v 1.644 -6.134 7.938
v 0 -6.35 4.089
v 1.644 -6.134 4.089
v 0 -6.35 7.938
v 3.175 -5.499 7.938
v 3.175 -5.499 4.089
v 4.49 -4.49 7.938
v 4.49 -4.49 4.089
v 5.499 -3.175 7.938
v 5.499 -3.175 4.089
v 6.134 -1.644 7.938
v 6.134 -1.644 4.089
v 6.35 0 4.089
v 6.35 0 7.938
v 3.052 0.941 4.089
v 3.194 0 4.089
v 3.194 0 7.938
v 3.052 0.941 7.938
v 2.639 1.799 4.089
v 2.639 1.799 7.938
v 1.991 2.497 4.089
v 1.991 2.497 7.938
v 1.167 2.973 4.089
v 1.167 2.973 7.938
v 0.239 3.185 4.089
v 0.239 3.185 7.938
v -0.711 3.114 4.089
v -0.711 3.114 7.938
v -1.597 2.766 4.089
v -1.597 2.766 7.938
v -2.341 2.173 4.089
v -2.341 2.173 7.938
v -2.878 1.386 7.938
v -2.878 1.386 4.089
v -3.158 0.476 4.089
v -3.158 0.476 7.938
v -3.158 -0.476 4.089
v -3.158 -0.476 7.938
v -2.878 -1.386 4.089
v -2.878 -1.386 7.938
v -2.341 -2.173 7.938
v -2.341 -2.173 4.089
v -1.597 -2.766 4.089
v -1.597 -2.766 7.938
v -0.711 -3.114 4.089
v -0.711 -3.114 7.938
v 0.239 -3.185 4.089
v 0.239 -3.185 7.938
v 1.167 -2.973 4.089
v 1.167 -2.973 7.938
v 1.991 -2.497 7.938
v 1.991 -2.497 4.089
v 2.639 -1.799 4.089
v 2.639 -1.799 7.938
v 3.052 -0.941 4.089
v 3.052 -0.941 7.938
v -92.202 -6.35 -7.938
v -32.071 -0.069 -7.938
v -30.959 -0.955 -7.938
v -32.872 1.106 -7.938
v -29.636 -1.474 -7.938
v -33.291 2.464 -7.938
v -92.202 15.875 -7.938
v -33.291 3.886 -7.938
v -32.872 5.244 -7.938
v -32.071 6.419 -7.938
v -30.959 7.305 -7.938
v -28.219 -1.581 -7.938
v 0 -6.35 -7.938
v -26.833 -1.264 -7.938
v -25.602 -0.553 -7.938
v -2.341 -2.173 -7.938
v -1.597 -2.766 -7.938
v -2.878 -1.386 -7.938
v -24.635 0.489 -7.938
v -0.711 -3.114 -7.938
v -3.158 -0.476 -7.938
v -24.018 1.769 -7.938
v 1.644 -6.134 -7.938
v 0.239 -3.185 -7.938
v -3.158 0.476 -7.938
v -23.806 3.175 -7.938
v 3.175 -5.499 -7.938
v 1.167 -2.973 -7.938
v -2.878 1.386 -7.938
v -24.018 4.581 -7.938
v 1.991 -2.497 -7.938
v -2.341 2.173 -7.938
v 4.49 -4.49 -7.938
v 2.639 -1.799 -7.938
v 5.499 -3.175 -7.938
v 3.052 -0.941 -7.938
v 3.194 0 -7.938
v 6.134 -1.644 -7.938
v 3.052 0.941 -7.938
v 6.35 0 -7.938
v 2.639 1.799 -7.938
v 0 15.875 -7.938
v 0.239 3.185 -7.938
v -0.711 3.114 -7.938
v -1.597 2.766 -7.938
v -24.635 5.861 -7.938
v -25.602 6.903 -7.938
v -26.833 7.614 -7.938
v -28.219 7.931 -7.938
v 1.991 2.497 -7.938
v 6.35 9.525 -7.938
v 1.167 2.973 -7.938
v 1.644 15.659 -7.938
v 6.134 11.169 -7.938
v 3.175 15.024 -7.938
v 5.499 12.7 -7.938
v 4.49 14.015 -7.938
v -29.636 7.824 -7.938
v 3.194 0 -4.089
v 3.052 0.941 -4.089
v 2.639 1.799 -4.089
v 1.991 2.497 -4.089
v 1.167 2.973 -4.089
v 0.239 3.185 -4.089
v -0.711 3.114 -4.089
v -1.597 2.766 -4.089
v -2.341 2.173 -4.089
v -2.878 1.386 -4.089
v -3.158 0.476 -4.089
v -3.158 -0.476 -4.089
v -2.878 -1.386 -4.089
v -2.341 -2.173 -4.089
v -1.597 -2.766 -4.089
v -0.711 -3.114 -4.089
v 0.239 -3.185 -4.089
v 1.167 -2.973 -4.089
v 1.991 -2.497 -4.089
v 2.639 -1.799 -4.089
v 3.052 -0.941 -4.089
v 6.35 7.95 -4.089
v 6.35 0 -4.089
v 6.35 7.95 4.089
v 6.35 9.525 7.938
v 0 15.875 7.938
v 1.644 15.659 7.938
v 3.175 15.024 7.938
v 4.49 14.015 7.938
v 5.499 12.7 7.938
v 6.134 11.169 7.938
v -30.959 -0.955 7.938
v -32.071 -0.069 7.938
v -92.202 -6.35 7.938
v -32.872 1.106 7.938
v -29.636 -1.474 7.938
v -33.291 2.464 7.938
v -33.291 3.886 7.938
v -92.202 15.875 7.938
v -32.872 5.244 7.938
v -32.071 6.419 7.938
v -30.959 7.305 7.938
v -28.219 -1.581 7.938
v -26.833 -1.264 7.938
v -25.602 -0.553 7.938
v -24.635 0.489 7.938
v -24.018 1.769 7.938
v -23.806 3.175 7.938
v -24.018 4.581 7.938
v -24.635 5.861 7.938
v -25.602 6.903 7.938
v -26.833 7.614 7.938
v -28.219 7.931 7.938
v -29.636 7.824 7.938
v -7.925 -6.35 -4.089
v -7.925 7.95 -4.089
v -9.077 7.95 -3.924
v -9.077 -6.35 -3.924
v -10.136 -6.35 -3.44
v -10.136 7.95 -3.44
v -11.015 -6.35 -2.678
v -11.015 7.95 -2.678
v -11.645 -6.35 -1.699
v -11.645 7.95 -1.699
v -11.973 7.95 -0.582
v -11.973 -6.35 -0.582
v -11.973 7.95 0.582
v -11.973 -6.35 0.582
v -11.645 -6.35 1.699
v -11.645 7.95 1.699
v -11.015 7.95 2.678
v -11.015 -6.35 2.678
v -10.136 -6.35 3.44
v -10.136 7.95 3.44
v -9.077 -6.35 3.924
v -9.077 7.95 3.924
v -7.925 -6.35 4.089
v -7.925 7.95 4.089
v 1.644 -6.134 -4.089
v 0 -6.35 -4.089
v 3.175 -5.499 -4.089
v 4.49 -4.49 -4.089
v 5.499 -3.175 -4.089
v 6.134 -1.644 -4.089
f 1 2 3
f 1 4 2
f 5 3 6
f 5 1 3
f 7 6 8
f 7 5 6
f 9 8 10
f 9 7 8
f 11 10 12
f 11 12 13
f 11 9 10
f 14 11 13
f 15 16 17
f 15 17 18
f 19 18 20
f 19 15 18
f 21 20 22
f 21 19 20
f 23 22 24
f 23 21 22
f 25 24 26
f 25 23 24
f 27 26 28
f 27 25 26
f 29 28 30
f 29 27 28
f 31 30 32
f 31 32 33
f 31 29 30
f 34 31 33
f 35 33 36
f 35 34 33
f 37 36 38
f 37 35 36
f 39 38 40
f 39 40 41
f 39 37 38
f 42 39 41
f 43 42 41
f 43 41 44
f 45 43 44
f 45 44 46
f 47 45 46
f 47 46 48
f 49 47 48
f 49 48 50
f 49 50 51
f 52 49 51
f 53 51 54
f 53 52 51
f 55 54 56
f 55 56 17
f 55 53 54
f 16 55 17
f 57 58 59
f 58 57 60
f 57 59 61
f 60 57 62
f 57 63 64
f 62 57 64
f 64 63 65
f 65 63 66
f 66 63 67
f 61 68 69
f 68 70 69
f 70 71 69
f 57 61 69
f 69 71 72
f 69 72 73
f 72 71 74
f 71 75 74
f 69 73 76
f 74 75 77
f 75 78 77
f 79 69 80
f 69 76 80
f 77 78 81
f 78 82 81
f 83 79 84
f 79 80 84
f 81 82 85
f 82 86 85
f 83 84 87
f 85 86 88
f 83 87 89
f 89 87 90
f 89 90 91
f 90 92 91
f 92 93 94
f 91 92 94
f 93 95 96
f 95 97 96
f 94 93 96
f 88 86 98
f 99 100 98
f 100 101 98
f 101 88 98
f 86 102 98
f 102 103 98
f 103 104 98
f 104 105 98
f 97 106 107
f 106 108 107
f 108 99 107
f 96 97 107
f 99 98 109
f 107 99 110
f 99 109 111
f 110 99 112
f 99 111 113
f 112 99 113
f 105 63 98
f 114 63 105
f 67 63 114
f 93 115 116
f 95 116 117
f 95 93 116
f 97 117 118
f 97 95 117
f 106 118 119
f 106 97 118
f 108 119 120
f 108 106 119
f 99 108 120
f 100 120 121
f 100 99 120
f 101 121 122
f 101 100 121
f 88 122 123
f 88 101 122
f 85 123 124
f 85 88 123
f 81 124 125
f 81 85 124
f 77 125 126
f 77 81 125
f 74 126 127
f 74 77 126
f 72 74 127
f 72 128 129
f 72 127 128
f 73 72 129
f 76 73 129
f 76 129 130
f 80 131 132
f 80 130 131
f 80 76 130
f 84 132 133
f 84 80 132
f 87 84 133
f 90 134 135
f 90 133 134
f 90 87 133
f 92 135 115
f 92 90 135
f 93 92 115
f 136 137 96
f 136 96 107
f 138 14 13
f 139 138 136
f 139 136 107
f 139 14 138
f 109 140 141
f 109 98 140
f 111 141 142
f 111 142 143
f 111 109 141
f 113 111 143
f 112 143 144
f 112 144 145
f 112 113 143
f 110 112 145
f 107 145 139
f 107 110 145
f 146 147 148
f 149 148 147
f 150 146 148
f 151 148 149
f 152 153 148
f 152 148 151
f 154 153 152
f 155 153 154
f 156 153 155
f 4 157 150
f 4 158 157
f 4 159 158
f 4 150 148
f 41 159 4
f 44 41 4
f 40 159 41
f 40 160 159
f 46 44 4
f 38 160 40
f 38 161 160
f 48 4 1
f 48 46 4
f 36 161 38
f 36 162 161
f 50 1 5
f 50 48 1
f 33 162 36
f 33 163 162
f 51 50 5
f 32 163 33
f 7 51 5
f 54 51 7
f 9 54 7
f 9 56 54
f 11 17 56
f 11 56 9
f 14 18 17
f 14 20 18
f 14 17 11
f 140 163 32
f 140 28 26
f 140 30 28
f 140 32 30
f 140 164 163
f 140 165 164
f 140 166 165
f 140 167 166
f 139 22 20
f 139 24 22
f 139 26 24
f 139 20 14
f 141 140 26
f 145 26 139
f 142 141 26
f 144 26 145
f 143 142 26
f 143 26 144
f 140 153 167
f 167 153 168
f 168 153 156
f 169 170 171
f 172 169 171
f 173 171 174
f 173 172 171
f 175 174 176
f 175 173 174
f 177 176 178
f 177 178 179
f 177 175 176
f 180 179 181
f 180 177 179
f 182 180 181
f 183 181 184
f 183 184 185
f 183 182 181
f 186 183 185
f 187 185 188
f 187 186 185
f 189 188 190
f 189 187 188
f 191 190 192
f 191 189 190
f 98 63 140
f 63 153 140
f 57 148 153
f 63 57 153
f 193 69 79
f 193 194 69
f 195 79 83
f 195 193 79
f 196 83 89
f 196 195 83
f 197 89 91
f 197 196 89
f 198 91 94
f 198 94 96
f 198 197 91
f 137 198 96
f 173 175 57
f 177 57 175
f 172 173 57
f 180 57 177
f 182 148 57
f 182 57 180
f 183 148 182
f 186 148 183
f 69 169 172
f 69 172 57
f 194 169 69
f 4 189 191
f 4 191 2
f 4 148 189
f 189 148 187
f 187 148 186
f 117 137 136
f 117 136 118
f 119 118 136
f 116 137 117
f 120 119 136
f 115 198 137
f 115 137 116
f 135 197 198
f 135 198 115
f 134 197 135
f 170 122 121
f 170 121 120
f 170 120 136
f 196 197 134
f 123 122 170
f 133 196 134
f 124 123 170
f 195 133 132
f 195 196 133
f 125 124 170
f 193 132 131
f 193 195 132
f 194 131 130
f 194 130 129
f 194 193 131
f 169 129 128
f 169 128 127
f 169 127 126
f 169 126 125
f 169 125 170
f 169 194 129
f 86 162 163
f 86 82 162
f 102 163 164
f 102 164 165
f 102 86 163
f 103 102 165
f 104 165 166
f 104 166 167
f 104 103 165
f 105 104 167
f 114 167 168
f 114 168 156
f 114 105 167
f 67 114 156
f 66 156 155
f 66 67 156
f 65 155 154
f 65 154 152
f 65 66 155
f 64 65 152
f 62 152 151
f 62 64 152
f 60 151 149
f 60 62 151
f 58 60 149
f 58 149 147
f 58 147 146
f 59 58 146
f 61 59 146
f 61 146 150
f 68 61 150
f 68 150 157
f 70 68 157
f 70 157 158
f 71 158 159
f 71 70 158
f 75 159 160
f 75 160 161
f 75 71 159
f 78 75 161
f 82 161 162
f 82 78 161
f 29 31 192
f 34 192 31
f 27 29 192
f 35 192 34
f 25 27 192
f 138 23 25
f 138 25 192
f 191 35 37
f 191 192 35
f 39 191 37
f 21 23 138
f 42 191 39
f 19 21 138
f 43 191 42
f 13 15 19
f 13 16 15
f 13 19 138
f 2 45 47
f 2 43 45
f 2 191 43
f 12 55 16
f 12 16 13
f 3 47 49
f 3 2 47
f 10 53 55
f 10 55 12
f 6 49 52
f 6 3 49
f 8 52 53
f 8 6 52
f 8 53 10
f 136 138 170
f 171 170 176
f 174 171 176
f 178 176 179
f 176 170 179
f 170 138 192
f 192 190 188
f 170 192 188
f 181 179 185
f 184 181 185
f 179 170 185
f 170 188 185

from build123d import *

# Parameters (mm, degrees)
SKETCH11_W         = 98.552
SKETCH11_H         = 22.225
SKETCH11_R         = 3.19405
SKETCH11_R_2       = 4.76885
EXTRUDE3_DEPTH     = 7.9375
CUT_EXTRUDE1_DEPTH = 14.3002
FILLET1_R          = 6.35


with BuildPart() as part:
    # Sketch11 → Extrude3 (new body, symmetric)
    with BuildSketch(Plane.XY):
        with Locations((-42.926, 4.7625)):
            Rectangle(SKETCH11_W, SKETCH11_H)
        Circle(SKETCH11_R, mode=Mode.SUBTRACT)
        with Locations((-28.575, 3.175)):
            Circle(SKETCH11_R_2, mode=Mode.SUBTRACT)
    extrude(amount=EXTRUDE3_DEPTH, both=True)

    # Sketch12 → Cut-Extrude1 (cut)
    with BuildSketch(Plane.XZ.offset(6.35)):
        with BuildLine():
            Line((-7.9248, 4.0894), (6.35, 4.0894))
            Line((6.35, 4.0894), (6.35, -4.0894))
            Line((6.35, -4.0894), (-7.9248, -4.0894))
            ThreePointArc((-7.9248, -4.0894), (-12.0142, 0), (-7.9248, 4.0894))
        make_face()
    extrude(amount=-CUT_EXTRUDE1_DEPTH, mode=Mode.SUBTRACT)

    # Fillet1
    fillet1_edges = [part.edges().sort_by_distance(p)[0] for p in [
        (6.35, -6.35, -6.01345),
        (6.35, 15.875, 0),
        (6.35, -6.35, 6.01345),
    ]]
    fillet(fillet1_edges, radius=FILLET1_R)


solid = part.part
